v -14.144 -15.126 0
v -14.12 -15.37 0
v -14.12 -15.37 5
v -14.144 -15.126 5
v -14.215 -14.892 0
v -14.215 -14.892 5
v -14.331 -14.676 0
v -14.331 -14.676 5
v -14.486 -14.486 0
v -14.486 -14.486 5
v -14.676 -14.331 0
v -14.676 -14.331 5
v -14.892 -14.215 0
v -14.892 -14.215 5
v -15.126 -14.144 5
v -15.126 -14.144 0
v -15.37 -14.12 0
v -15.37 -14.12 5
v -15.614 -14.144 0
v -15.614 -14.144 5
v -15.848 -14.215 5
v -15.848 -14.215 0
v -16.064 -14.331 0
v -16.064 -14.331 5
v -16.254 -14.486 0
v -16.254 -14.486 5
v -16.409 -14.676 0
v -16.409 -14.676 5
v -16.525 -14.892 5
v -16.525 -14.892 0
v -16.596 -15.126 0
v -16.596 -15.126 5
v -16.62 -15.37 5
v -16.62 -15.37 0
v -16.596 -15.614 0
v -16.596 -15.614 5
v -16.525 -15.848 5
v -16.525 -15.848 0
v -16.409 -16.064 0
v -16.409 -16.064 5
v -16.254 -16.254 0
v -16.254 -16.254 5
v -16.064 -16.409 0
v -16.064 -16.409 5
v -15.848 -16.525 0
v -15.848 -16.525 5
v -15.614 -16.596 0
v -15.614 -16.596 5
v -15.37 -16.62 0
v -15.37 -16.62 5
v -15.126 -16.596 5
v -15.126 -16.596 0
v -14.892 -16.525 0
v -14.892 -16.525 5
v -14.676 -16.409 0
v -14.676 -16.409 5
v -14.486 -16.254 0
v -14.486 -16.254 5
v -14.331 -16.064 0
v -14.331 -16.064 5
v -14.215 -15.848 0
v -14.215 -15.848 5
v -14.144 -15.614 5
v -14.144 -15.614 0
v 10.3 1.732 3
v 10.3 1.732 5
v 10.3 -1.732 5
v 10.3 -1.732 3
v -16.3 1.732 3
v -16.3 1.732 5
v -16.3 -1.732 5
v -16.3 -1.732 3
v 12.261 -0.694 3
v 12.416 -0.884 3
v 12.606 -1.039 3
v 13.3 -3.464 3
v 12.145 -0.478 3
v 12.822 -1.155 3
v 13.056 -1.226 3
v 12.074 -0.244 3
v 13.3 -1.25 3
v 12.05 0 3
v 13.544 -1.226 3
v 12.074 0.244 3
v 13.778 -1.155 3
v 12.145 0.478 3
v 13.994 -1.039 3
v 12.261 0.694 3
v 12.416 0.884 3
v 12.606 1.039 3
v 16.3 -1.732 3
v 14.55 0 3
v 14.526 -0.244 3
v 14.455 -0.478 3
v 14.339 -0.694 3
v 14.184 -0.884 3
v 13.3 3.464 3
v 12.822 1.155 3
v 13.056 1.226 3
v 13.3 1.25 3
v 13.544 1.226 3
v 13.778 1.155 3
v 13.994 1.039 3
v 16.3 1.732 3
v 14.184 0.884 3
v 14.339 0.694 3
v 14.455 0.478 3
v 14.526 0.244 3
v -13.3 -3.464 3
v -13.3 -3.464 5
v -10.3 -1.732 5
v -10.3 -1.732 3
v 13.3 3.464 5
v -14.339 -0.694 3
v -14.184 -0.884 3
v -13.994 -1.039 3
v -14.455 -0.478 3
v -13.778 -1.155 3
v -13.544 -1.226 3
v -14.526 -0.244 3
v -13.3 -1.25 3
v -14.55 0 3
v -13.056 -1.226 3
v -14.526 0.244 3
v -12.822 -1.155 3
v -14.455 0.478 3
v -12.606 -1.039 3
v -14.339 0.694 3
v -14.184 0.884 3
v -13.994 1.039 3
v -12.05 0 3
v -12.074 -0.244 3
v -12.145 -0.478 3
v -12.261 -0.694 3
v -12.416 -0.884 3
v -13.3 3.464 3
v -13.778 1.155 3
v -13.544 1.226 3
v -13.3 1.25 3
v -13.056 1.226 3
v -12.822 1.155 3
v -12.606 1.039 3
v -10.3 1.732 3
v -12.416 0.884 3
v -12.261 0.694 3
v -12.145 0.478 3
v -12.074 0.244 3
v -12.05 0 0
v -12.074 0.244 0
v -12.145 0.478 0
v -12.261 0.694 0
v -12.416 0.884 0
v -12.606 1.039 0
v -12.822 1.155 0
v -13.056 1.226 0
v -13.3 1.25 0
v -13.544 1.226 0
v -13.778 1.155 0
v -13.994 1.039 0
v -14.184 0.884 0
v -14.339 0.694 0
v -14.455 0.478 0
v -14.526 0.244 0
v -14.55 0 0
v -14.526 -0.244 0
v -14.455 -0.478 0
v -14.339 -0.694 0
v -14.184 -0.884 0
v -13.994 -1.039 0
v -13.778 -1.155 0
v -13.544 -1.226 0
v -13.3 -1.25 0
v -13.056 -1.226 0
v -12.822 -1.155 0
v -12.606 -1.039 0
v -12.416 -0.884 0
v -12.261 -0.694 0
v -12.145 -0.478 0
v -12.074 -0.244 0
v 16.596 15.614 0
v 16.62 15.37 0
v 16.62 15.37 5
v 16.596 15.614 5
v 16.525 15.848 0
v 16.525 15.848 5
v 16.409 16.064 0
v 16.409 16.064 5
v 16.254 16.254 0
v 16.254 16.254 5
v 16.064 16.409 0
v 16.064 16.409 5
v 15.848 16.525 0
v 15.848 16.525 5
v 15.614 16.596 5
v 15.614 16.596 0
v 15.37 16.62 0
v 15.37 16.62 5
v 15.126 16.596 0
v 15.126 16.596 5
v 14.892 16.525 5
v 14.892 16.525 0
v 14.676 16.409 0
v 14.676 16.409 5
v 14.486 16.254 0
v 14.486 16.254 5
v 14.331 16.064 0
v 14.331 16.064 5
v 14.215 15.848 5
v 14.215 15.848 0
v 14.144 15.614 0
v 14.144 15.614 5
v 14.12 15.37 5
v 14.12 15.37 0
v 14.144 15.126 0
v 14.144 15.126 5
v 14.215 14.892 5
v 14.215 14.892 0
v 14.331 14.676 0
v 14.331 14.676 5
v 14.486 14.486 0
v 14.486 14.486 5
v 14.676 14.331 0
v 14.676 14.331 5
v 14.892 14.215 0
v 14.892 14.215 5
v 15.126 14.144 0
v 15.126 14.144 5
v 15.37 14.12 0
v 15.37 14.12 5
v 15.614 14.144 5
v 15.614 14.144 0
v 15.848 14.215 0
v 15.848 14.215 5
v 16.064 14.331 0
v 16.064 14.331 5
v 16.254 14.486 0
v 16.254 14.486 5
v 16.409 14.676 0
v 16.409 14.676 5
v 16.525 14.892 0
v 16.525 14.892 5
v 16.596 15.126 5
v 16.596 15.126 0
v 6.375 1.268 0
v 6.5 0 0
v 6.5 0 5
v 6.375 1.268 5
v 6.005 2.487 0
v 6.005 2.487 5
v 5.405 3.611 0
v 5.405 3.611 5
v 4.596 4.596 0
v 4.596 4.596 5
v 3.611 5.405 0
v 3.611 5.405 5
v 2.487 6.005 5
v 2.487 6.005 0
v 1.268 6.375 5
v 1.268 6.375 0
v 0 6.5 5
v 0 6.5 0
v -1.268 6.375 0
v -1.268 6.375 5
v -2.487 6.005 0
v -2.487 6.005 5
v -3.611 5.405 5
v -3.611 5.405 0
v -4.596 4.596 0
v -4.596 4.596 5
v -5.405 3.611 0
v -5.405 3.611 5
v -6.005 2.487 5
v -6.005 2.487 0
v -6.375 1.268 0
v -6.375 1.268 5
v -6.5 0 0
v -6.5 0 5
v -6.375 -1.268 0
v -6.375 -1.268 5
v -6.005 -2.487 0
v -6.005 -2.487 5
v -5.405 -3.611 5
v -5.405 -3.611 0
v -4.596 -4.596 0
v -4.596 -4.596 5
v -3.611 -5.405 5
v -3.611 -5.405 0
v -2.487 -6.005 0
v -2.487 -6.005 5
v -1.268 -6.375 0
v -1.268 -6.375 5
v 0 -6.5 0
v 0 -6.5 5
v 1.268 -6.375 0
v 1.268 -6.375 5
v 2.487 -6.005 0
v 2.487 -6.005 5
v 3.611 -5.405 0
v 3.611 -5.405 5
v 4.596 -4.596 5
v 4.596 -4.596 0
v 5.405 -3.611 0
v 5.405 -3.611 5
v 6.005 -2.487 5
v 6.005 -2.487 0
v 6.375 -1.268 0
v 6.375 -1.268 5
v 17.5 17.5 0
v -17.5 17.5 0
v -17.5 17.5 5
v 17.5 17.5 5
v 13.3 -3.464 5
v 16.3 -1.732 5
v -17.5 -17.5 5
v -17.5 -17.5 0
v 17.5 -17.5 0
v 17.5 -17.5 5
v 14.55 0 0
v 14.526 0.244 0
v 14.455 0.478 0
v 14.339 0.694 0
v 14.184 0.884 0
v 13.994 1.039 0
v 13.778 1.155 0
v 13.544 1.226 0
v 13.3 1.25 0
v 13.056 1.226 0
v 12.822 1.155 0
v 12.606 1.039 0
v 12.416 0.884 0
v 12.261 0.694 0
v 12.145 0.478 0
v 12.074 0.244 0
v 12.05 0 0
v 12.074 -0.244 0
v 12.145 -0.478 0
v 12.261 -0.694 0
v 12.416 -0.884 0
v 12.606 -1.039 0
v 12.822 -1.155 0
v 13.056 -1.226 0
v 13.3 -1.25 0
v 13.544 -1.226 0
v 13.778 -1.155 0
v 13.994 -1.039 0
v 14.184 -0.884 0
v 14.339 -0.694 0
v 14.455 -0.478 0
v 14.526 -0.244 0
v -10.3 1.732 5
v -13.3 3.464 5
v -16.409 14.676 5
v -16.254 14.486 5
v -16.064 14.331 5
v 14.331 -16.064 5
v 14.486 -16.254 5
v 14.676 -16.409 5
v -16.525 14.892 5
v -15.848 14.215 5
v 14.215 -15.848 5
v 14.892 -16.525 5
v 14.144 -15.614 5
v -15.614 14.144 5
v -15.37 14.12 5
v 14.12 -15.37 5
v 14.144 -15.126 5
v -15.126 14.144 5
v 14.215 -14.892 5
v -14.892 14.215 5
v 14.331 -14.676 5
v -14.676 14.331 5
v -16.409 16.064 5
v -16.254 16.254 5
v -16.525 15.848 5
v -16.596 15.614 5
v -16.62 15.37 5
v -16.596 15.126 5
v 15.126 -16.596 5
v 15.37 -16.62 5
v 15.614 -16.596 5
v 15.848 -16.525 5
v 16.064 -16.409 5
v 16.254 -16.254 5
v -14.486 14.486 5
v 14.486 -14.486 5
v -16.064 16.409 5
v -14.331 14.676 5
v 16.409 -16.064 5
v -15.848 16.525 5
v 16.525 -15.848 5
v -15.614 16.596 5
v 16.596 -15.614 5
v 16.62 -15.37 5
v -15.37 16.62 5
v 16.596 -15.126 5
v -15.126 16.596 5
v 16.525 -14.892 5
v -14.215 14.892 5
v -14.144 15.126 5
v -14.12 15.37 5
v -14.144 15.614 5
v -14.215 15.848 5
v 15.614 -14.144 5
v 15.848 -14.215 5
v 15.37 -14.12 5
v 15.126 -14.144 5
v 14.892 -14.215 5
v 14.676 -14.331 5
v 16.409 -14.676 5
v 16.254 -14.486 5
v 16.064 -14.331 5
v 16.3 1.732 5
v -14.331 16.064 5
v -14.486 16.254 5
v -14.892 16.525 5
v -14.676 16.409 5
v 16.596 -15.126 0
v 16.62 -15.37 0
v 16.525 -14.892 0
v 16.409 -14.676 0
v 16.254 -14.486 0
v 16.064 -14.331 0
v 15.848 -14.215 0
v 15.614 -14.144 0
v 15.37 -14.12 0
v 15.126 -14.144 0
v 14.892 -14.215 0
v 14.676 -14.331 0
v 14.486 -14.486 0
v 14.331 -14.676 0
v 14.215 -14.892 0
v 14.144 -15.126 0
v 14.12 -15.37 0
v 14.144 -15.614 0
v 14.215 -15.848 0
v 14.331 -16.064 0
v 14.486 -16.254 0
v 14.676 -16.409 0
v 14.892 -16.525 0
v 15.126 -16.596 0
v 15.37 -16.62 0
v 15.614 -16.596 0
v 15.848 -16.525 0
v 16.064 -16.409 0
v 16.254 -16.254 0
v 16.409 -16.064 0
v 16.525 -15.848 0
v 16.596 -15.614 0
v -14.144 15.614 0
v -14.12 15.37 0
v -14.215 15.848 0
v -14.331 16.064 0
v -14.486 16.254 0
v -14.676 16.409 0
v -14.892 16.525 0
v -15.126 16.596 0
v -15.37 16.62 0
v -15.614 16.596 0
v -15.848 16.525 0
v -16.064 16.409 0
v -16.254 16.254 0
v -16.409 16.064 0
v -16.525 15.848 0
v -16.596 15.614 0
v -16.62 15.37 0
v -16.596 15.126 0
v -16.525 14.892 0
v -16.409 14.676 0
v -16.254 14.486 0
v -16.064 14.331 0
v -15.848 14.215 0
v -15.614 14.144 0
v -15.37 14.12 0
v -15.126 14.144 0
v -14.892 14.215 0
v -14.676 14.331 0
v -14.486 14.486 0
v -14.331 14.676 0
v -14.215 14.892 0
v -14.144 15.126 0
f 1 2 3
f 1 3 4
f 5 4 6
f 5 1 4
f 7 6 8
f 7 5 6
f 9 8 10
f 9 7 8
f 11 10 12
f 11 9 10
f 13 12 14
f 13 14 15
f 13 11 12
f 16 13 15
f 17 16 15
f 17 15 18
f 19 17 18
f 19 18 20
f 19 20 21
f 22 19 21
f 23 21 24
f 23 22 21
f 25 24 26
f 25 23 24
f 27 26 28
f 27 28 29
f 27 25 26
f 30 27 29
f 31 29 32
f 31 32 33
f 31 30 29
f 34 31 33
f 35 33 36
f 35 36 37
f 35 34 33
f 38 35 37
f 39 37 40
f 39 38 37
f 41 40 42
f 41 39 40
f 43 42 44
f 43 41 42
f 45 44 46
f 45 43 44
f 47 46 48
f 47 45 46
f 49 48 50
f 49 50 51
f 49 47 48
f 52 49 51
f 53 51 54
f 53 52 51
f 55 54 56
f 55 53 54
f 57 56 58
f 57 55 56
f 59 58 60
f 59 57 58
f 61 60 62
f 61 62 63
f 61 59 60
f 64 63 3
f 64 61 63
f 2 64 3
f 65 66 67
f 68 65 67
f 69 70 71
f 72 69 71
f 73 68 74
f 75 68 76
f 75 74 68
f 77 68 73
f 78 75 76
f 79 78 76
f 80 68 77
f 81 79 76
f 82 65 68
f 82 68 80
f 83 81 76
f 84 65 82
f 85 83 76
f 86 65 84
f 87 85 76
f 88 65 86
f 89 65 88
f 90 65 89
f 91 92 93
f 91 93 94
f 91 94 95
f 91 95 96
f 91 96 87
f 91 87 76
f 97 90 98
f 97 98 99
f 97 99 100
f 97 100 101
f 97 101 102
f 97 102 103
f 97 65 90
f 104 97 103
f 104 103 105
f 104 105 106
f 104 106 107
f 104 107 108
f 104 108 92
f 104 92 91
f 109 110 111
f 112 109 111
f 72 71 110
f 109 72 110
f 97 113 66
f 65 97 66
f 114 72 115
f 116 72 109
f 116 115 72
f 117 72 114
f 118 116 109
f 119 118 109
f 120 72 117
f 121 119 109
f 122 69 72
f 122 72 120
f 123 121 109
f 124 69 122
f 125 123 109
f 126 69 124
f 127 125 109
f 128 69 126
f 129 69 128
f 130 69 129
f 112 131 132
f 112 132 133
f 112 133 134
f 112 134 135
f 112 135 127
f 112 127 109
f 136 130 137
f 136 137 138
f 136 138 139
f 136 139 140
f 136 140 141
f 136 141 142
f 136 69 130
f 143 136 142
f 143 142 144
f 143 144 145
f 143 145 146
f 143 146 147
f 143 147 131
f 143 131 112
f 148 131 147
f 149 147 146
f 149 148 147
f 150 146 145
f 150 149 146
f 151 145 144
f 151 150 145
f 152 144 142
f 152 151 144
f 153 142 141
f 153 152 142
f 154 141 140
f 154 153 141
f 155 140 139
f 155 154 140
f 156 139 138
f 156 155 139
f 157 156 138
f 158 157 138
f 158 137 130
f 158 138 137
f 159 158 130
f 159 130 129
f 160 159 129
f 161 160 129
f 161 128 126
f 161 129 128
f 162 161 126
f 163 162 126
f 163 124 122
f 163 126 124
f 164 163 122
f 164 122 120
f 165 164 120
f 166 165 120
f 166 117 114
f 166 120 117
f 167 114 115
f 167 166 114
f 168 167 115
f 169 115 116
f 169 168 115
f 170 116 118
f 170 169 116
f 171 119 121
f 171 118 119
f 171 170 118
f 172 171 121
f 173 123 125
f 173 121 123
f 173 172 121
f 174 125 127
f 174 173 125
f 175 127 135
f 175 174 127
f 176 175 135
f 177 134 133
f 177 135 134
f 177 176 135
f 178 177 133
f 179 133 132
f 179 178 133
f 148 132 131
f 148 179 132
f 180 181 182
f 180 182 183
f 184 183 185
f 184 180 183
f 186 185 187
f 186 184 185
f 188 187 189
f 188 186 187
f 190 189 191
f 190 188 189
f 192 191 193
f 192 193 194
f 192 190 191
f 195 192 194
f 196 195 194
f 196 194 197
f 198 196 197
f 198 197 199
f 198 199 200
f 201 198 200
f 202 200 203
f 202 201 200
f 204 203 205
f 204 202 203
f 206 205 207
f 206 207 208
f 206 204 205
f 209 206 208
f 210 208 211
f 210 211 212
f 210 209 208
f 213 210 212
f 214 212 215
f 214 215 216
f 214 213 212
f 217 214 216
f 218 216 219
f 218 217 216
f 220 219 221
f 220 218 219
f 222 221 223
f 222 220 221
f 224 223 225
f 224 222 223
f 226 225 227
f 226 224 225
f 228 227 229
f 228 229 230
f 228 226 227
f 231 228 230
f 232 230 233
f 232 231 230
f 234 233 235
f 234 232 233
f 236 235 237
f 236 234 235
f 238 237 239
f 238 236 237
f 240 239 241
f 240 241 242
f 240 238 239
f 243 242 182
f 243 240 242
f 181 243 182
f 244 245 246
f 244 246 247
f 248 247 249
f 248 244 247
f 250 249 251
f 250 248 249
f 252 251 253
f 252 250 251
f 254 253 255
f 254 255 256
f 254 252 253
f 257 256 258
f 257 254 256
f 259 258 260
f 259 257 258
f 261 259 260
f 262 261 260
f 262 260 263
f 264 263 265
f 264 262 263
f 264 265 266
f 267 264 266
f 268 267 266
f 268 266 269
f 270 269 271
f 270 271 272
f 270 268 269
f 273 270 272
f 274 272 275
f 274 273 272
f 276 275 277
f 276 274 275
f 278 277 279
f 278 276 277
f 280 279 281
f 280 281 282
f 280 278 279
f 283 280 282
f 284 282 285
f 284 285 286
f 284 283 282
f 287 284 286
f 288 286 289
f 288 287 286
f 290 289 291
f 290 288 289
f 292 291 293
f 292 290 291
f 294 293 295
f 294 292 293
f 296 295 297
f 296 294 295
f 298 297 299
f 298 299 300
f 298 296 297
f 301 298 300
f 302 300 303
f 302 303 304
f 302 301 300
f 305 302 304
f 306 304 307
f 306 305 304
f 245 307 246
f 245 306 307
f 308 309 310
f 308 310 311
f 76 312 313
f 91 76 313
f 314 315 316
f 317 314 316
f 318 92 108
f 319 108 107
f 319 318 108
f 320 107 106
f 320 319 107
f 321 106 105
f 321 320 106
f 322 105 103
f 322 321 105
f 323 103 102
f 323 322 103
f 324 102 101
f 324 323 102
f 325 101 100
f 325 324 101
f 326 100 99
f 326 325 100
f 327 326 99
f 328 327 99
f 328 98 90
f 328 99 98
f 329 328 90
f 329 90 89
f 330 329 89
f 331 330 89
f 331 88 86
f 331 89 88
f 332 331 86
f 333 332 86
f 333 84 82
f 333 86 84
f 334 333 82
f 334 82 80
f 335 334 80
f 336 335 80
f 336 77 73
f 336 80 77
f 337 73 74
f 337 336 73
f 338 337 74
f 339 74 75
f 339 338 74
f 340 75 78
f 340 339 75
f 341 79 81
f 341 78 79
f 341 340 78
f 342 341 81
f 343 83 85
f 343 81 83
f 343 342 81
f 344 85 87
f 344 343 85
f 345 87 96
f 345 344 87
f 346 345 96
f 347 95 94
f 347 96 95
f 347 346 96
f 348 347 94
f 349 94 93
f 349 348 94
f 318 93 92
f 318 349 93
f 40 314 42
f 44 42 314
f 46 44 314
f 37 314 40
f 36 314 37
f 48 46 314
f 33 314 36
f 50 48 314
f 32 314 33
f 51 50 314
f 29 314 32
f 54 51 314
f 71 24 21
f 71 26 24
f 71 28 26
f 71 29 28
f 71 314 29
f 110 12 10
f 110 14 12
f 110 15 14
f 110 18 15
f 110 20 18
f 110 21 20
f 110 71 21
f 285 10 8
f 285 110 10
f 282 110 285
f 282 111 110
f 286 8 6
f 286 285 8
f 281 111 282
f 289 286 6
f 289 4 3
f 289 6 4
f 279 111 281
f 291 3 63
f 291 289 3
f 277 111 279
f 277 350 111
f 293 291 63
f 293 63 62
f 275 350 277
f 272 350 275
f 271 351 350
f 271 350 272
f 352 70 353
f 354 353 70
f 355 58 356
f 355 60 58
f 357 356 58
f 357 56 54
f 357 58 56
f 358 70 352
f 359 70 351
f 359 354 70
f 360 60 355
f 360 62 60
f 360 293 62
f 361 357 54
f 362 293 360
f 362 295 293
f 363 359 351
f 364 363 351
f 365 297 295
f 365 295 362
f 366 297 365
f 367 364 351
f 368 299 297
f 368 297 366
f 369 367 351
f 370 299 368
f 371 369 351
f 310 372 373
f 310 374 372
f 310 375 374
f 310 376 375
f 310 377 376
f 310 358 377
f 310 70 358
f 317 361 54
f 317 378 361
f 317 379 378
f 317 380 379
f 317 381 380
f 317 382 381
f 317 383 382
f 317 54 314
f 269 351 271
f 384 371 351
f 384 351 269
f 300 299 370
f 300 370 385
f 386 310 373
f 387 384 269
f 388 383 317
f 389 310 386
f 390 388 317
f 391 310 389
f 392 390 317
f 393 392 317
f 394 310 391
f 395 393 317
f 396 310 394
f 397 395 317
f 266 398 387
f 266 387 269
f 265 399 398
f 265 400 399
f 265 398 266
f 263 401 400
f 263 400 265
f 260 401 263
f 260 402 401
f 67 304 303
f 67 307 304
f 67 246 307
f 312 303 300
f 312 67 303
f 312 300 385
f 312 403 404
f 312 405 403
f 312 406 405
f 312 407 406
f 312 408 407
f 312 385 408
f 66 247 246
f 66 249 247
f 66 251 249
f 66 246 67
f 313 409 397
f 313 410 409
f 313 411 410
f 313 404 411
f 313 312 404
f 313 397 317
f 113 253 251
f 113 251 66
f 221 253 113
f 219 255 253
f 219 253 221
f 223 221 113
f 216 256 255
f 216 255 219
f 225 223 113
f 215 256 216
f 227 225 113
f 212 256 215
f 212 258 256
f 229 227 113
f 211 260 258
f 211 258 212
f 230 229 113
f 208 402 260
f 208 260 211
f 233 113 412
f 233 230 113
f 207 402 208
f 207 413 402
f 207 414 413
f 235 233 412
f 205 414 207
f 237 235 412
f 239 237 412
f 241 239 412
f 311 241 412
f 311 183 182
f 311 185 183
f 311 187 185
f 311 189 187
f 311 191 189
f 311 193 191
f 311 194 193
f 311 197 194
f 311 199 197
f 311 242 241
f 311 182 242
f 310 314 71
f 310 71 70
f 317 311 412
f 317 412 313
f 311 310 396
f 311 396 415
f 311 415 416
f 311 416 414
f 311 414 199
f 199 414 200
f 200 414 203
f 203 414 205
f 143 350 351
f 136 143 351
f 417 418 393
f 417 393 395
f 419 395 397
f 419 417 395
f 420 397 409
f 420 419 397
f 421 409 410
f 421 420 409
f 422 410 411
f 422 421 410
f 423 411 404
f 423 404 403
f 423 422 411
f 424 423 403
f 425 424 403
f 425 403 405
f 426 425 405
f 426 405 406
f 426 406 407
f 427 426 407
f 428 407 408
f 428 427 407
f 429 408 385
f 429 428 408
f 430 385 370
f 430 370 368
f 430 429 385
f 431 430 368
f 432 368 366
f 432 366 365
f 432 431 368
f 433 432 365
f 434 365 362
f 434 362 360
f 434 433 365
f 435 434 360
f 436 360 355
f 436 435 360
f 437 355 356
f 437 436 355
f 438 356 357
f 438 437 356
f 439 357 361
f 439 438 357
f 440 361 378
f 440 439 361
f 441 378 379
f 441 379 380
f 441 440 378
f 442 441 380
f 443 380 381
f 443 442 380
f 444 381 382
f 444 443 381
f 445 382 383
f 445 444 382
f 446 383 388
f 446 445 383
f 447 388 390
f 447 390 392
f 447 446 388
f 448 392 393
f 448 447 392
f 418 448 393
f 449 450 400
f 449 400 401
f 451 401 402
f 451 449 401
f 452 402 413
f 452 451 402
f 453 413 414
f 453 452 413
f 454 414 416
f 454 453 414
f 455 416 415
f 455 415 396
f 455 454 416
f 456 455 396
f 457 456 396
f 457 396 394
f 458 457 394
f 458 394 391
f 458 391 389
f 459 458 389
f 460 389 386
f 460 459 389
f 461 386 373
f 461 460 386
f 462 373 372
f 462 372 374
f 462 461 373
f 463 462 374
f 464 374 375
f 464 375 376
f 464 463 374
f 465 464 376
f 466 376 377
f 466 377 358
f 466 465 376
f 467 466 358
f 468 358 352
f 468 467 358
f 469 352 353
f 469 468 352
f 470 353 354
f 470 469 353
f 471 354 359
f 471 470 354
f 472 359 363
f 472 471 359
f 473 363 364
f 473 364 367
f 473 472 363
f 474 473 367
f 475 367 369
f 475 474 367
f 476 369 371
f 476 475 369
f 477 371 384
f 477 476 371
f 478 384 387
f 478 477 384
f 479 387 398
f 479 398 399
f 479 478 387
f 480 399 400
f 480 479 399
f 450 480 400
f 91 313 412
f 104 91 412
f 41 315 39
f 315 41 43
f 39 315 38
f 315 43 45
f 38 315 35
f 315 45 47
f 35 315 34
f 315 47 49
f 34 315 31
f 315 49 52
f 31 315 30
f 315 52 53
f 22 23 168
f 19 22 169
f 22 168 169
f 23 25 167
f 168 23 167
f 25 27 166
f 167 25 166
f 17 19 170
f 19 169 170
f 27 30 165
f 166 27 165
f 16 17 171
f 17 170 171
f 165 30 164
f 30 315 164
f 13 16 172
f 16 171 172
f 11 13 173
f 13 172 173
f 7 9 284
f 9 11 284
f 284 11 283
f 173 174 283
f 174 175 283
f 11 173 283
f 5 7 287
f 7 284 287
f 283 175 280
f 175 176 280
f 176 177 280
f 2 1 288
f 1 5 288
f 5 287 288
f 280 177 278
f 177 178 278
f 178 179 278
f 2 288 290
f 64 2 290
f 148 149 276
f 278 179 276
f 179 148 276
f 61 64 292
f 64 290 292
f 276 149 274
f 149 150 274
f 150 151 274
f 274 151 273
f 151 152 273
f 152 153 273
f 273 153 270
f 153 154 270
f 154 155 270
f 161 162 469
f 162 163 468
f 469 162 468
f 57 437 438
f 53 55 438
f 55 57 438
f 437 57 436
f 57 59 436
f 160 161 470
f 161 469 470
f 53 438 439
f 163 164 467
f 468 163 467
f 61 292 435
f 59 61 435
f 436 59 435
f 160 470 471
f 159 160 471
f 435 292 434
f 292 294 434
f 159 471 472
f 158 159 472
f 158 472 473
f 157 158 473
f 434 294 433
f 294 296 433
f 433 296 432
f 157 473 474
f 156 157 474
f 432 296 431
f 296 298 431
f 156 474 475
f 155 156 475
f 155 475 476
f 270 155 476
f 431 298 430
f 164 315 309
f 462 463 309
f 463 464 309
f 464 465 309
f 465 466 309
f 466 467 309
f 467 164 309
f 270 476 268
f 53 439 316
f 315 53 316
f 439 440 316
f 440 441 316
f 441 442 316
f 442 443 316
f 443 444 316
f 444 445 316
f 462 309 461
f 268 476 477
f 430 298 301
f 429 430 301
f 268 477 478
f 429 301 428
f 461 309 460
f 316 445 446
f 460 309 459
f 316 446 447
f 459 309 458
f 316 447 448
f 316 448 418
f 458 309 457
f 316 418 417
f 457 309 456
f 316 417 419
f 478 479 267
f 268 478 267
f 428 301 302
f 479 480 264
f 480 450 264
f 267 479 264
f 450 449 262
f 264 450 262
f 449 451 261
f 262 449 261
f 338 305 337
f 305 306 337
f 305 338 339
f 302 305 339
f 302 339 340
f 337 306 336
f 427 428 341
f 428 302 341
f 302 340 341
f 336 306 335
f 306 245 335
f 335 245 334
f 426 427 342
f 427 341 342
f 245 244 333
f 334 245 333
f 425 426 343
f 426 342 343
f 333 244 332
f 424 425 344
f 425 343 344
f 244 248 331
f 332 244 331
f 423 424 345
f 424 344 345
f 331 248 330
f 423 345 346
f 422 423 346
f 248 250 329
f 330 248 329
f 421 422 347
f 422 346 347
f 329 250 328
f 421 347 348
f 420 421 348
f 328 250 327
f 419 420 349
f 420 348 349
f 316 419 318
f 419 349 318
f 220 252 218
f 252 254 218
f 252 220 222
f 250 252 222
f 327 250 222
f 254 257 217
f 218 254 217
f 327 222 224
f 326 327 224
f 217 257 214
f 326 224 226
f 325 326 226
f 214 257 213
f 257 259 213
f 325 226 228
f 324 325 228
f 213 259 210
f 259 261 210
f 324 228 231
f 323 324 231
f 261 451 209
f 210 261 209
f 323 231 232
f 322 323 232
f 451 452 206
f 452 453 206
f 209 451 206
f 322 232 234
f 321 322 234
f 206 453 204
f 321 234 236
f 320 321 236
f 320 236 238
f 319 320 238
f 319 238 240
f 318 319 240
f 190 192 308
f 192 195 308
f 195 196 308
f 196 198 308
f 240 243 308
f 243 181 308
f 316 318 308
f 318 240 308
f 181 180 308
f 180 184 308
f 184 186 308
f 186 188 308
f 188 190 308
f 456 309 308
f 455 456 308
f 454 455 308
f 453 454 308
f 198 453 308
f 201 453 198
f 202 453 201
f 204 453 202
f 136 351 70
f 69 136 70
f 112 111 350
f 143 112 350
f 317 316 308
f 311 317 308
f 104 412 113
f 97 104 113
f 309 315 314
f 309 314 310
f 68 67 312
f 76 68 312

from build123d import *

# Parameters (mm, degrees)
CROQUIS1_W              = 35
CROQUIS1_H              = 35
CROQUIS1_R              = 1.25
CROQUIS1_R_2            = 6.5
SALIENTE_EXTRUIR1_DEPTH = 5
CORTAR_EXTRUIR1_DEPTH   = 2


with BuildPart() as part:
    # Croquis1 → Saliente-Extruir1 (new body)
    with BuildSketch(Plane.XY):
        Rectangle(CROQUIS1_W, CROQUIS1_H)
        with Locations((-15.37, 15.37)):
            Circle(CROQUIS1_R, mode=Mode.SUBTRACT)
        with Locations((15.37, 15.37)):
            Circle(CROQUIS1_R, mode=Mode.SUBTRACT)
        with Locations((15.37, -15.37)):
            Circle(CROQUIS1_R, mode=Mode.SUBTRACT)
        with Locations((-15.37, -15.37)):
            Circle(CROQUIS1_R, mode=Mode.SUBTRACT)
        Circle(CROQUIS1_R_2, mode=Mode.SUBTRACT)
        with Locations((13.3, 0)):
            Circle(CROQUIS1_R, mode=Mode.SUBTRACT)
        with Locations((-13.3, 0)):
            Circle(CROQUIS1_R, mode=Mode.SUBTRACT)
    extrude(amount=SALIENTE_EXTRUIR1_DEPTH)

    # Croquis2 → Cortar-Extruir1 (cut)
    with BuildSketch(Plane.XY.offset(5)):
        Polygon((-13.3, 3.464101615), (-16.3, 1.732050808), (-16.3, -1.732050808), (-13.3, -3.464101615), (-10.3, -1.732050808), (-10.3, 1.732050808), align=None)
        Polygon((13.3, 3.464101615), (10.3, 1.732050808), (10.3, -1.732050808), (13.3, -3.464101615), (16.3, -1.732050808), (16.3, 1.732050808), align=None)
    extrude(amount=-CORTAR_EXTRUIR1_DEPTH, mode=Mode.SUBTRACT)


solid = part.part
